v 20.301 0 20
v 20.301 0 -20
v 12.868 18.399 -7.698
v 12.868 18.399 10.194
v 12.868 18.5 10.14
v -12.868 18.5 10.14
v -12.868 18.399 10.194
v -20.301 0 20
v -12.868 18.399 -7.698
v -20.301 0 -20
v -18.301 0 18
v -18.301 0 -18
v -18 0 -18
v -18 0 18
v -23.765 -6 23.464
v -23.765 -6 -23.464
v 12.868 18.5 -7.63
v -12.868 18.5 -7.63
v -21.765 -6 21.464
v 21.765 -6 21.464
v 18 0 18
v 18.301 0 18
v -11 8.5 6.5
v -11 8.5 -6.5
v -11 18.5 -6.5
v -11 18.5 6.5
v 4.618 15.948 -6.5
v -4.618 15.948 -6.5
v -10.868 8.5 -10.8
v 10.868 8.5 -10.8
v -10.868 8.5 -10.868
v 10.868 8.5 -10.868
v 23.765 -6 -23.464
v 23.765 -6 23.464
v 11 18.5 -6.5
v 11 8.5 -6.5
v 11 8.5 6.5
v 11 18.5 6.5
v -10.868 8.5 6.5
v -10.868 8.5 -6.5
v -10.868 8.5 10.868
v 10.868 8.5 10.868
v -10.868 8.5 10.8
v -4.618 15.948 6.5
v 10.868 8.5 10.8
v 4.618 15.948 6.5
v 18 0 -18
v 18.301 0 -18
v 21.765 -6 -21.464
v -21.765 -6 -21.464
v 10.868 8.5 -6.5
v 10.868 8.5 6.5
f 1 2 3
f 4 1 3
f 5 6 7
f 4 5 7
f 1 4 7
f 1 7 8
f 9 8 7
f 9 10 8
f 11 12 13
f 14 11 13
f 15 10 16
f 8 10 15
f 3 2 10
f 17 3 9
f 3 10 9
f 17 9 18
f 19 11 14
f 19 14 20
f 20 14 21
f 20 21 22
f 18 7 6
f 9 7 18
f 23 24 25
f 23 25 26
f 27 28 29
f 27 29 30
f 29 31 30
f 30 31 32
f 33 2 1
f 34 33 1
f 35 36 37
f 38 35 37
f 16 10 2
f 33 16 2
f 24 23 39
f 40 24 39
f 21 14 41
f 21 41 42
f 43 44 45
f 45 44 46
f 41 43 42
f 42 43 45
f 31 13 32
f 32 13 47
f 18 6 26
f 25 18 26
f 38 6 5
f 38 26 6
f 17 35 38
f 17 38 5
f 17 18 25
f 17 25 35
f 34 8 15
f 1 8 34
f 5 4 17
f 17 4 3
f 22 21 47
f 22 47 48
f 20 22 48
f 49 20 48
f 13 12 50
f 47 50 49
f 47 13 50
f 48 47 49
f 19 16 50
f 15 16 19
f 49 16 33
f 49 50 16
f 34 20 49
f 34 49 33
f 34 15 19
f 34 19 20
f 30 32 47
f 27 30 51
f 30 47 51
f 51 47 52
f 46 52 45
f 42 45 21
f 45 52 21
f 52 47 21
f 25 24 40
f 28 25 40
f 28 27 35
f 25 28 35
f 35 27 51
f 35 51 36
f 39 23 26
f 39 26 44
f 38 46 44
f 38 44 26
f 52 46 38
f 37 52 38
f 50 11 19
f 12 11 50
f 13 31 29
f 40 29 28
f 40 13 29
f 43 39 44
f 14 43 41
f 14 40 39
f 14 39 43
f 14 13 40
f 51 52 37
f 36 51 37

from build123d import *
from OCP.BRepFilletAPI import BRepFilletAPI_MakeChamfer

# Parameters (mm, degrees)
SKETCH1_W               = 40
SKETCH1_H               = 40
BOSS_EXTRUDE1_DEPTH     = 8.5
BOSS_EXTRUDE1_TAPER     = 40
SKETCH2_W               = 36
SKETCH2_H               = 36
CUT_EXTRUDE1_DEPTH      = 15
CUT_EXTRUDE1_DRAFT      = -40
SKETCH4_W               = 25.73530627
SKETCH4_H               = 25.73530627
BOSS_EXTRUDE3_DEPTH     = 10
SKETCH5_W               = 22
SKETCH5_H               = 13
CUT_EXTRUDE2_DEPTH      = 31.000000133
CHAMFER2_SIZE           = 12
CHAMFER2_SIZE_2         = 9.89892863
CUT_EXTRUDE3_DEPTH      = 35.154586706
CUT_EXTRUDE3_DEPTH_BACK = 35.154586706
CHAMFER3_SIZE           = 4.3
CHAMFER3_SIZE2          = 7.447818473
CUT_EXTRUDE4_DEPTH      = 35.154586706
CUT_EXTRUDE4_DEPTH_BACK = 35.154586706
SKETCH9_W               = 40.602605658
SKETCH9_H               = 40
BOSS_EXTRUDE4_DEPTH     = 6
BOSS_EXTRUDE4_DRAFT     = -30
SKETCH10_W              = 36.602605658
SKETCH10_H              = 36
CUT_EXTRUDE5_DEPTH      = 10
CUT_EXTRUDE5_DRAFT      = 30


with BuildPart() as part:
    # Sketch1 → Boss-Extrude1 (new body)
    with BuildSketch(Plane(origin=(0, 0, 0), x_dir=(1, 0, 0), z_dir=(0, 1, 0))):
        Rectangle(SKETCH1_W, SKETCH1_H)
    extrude(amount=BOSS_EXTRUDE1_DEPTH, taper=BOSS_EXTRUDE1_TAPER)


with BuildPart() as cut_extrude1_tool:
    # Sketch2 → Cut-Extrude1 (with draft: the straight prism first)
    with BuildSketch(Plane.XZ):
        Rectangle(SKETCH2_W, SKETCH2_H)
    extrude(amount=-CUT_EXTRUDE1_DEPTH)
    # Cut-Extrude1: the draft: its side faces are tilted about the plane it starts from
    cut_extrude1_sides = [cut_extrude1_tool.faces().sort_by_distance(p)[0] for p in [
        (0, 7.5, -18),
        (18, 7.5, 0),
        (0, 7.5, 18),
        (-18, 7.5, 0),
    ]]
    draft(cut_extrude1_sides, Plane.XZ, CUT_EXTRUDE1_DRAFT)


with BuildPart() as part_1:
    add(part.part)

    # Cut-Extrude1: cut by cut_extrude1_tool
    add(cut_extrude1_tool.part, mode=Mode.SUBTRACT)

    # Sketch4 → Boss-Extrude3 (add)
    with BuildSketch(Plane(origin=(0, 8.5, 0), x_dir=(1, 0, 0), z_dir=(0, 1, 0))):
        Rectangle(SKETCH4_W, SKETCH4_H)
    extrude(amount=BOSS_EXTRUDE3_DEPTH)

    # Sketch5 → Cut-Extrude2 (cut, through all)
    with BuildSketch(Plane.XZ.offset(-8.5)):
        Rectangle(SKETCH5_W, SKETCH5_H)
    extrude(amount=-CUT_EXTRUDE2_DEPTH, mode=Mode.SUBTRACT)

    # Chamfer2
    # the kernel refuses this chamfer: 12, 9.89892863 mm, written as the material it adds along each edge
    with BuildSketch(Plane(origin=(12.867653135, 8.5, 44.011128682), x_dir=(0.6427876096865404, -0.7660444431189772, 0), z_dir=(0, 0, -1))) as chamfer2_piece_1_section:
        Polygon((CHAMFER2_SIZE, 0), (-CHAMFER2_SIZE_2 * 0.766044443108, -CHAMFER2_SIZE_2 * 0.642787609677), (0, 0), align=None)
    chamfer2_piece_1 = extrude(amount=88.022257365, mode=Mode.PRIVATE)
    chamfer2_piece_1 = split(chamfer2_piece_1, bisect_by=Plane(origin=(12.867653135, 0, 44.011128682), z_dir=(0, 1, 0)), keep=Keep.TOP, mode=Mode.PRIVATE)
    chamfer2_piece_1 = split(chamfer2_piece_1, bisect_by=Plane(origin=(12.867653135, -0.927920344, 20.676206983), z_dir=(0, -0.37460659341591307, -0.9271838545667871)), keep=Keep.TOP, mode=Mode.PRIVATE)
    chamfer2_piece_1 = split(chamfer2_piece_1, bisect_by=Plane(origin=(12.867653135, 29.644778588, -8.32403482), z_dir=(0, -0.37460659341591274, 0.9271838545667872)), keep=Keep.TOP, mode=Mode.PRIVATE)
    add(chamfer2_piece_1)
    with BuildSketch(Plane(origin=(-12.867653135, 8.5, -44.011128682), x_dir=(-0.6427876096865406, -0.766044443118977, 0), z_dir=(0, 0, 1))) as chamfer2_piece_2_section:
        Polygon((CHAMFER2_SIZE, 0), (-CHAMFER2_SIZE_2 * 0.766044443108, -CHAMFER2_SIZE_2 * 0.642787609677), (0, 0), align=None)
    chamfer2_piece_2 = extrude(amount=88.022257365, mode=Mode.PRIVATE)
    chamfer2_piece_2 = split(chamfer2_piece_2, bisect_by=Plane(origin=(-12.867653135, 0, -44.011128682), z_dir=(0, 1, 0)), keep=Keep.TOP, mode=Mode.PRIVATE)
    chamfer2_piece_2 = split(chamfer2_piece_2, bisect_by=Plane(origin=(-12.867653135, -0.927920344, -20.676206983), z_dir=(0, -0.37460659341591274, 0.9271838545667872)), keep=Keep.TOP, mode=Mode.PRIVATE)
    chamfer2_piece_2 = split(chamfer2_piece_2, bisect_by=Plane(origin=(-12.867653135, 29.644778588, 8.32403482), z_dir=(0, -0.37460659341591307, -0.9271838545667871)), keep=Keep.TOP, mode=Mode.PRIVATE)
    add(chamfer2_piece_2)
    with BuildSketch(Plane(origin=(-44.011128682, 8.5, 12.867653135), x_dir=(0, -0.766044443118977, 0.6427876096865405), z_dir=(1, 0, 0))) as chamfer2_piece_3_section:
        Polygon((CHAMFER2_SIZE, 0), (-CHAMFER2_SIZE_2 * 0.766044443108, -CHAMFER2_SIZE_2 * 0.642787609677), (0, 0), align=None)
    chamfer2_piece_3 = extrude(amount=88.022257365, mode=Mode.PRIVATE)
    chamfer2_piece_3 = split(chamfer2_piece_3, bisect_by=Plane(origin=(-44.011128682, 0, 12.867653135), z_dir=(0, 1, 0)), keep=Keep.TOP, mode=Mode.PRIVATE)
    chamfer2_piece_3 = split(chamfer2_piece_3, bisect_by=Plane(origin=(-20.676206983, -0.927920344, 12.867653135), z_dir=(0.927183854566787, -0.37460659341591307, 0)), keep=Keep.TOP, mode=Mode.PRIVATE)
    chamfer2_piece_3 = split(chamfer2_piece_3, bisect_by=Plane(origin=(8.32403482, 29.644778588, 12.867653135), z_dir=(-0.9271838545667872, -0.37460659341591274, 0)), keep=Keep.TOP, mode=Mode.PRIVATE)
    add(chamfer2_piece_3)
    with BuildSketch(Plane(origin=(44.011128682, 8.5, -12.867653135), x_dir=(0, -0.766044443118977, -0.6427876096865405), z_dir=(-1, 0, 0))) as chamfer2_piece_4_section:
        Polygon((CHAMFER2_SIZE, 0), (-CHAMFER2_SIZE_2 * 0.766044443108, -CHAMFER2_SIZE_2 * 0.642787609677), (0, 0), align=None)
    chamfer2_piece_4 = extrude(amount=88.022257365, mode=Mode.PRIVATE)
    chamfer2_piece_4 = split(chamfer2_piece_4, bisect_by=Plane(origin=(44.011128682, 0, -12.867653135), z_dir=(0, 1, 0)), keep=Keep.TOP, mode=Mode.PRIVATE)
    chamfer2_piece_4 = split(chamfer2_piece_4, bisect_by=Plane(origin=(-8.32403482, 29.644778588, -12.867653135), z_dir=(0.927183854566787, -0.37460659341591307, 0)), keep=Keep.TOP, mode=Mode.PRIVATE)
    chamfer2_piece_4 = split(chamfer2_piece_4, bisect_by=Plane(origin=(20.676206983, -0.927920344, -12.867653135), z_dir=(-0.9271838545667872, -0.37460659341591274, 0)), keep=Keep.TOP, mode=Mode.PRIVATE)
    add(chamfer2_piece_4)

    # Sketch7 → Cut-Extrude3 (cut, two sides: drawn at the far end of the back side and taken through both)
    with BuildSketch(Plane(origin=(0, 0, 0), x_dir=(0, 0, -1), z_dir=(1, 0, 0)).offset(-CUT_EXTRUDE3_DEPTH_BACK)):
        Polygon((-20, 0), (-24.78585356, 0), (-24.78585356, 18.532984169), (-10.14, 18.5), align=None)
    extrude(amount=CUT_EXTRUDE3_DEPTH + CUT_EXTRUDE3_DEPTH_BACK, mode=Mode.SUBTRACT)

    # Chamfer3: one chamfer whose edges measure the first distance from different faces: ONE call of the kernel's chamfer builder (chamfer() names one face for all edges)
    chamfer3_edges_1 = [part_1.edges().sort_by_distance(p)[0] for p in [
        (0, 8.5, 6.5),
    ]]
    chamfer3_side_1 = [part_1.faces().sort_by_distance(p)[0] for p in [
        (0, 8.5, 8.683826567),
    ]]
    chamfer3_edges_2 = [part_1.edges().sort_by_distance(p)[0] for p in [
        (0, 8.5, -6.5),
    ]]
    chamfer3_side_2 = [part_1.faces().sort_by_distance(p)[0] for p in [
        (0, 8.5, -8.683826567),
    ]]
    chamfer3 = BRepFilletAPI_MakeChamfer(part_1.part.solid().wrapped)
    for e in chamfer3_edges_1:
        chamfer3.Add(CHAMFER3_SIZE, CHAMFER3_SIZE2, e.wrapped, chamfer3_side_1[0].wrapped)  # the first distance lies on this face
    for e in chamfer3_edges_2:
        chamfer3.Add(CHAMFER3_SIZE, CHAMFER3_SIZE2, e.wrapped, chamfer3_side_2[0].wrapped)  # the first distance lies on this face
    add(Compound.cast(chamfer3.Shape()), mode=Mode.REPLACE)

    # Sketch8 → Cut-Extrude4 (cut, two sides: drawn at the far end of the back side and taken through both)
    with BuildSketch(Plane(origin=(0, 0, 0), x_dir=(0, 0, -1), z_dir=(1, 0, 0)).offset(-CUT_EXTRUDE4_DEPTH_BACK)):
        Polygon((7.63, 18.5), (12.867653135, 18.5), (21.160182577, 0), (20, 0), align=None)
    extrude(amount=CUT_EXTRUDE4_DEPTH + CUT_EXTRUDE4_DEPTH_BACK, mode=Mode.SUBTRACT)


with BuildPart() as boss_extrude4_tool:
    # Sketch9 → Boss-Extrude4 (with draft: the straight prism first)
    with BuildSketch(Plane.XZ):
        Rectangle(SKETCH9_W, SKETCH9_H)
    extrude(amount=BOSS_EXTRUDE4_DEPTH)
    # Boss-Extrude4: the draft: its side faces are tilted about the plane it starts from
    boss_extrude4_sides = [boss_extrude4_tool.faces().sort_by_distance(p)[0] for p in [
        (0, -3, -20),
        (20.301302829, -3, 0),
        (0, -3, 20),
        (-20.301302829, -3, 0),
    ]]
    draft(boss_extrude4_sides, Plane.XZ, BOSS_EXTRUDE4_DRAFT)


with BuildPart() as part_2:
    add(part_1.part)

    # Boss-Extrude4: add boss_extrude4_tool
    add(boss_extrude4_tool.part)


with BuildPart() as cut_extrude5_tool:
    # Sketch10 → Cut-Extrude5 (with draft: the straight prism first)
    with BuildSketch(Plane(origin=(0, 0, 0), x_dir=(1, 0, 0), z_dir=(0, 1, 0))):
        Rectangle(SKETCH10_W, SKETCH10_H)
    extrude(amount=-CUT_EXTRUDE5_DEPTH)
    # Cut-Extrude5: the draft: its side faces are tilted about the plane it starts from
    cut_extrude5_sides = [cut_extrude5_tool.faces().sort_by_distance(p)[0] for p in [
        (0, -5, 18),
        (18.301302829, -5, 0),
        (0, -5, -18),
        (-18.301302829, -5, 0),
    ]]
    draft(cut_extrude5_sides, Plane(origin=(0, 0, 0), x_dir=(1, 0, 0), z_dir=(0, 1, 0)), CUT_EXTRUDE5_DRAFT)


with BuildPart() as part_3:
    add(part_2.part)

    # Cut-Extrude5: cut by cut_extrude5_tool
    add(cut_extrude5_tool.part, mode=Mode.SUBTRACT)


solid = part_3.part
